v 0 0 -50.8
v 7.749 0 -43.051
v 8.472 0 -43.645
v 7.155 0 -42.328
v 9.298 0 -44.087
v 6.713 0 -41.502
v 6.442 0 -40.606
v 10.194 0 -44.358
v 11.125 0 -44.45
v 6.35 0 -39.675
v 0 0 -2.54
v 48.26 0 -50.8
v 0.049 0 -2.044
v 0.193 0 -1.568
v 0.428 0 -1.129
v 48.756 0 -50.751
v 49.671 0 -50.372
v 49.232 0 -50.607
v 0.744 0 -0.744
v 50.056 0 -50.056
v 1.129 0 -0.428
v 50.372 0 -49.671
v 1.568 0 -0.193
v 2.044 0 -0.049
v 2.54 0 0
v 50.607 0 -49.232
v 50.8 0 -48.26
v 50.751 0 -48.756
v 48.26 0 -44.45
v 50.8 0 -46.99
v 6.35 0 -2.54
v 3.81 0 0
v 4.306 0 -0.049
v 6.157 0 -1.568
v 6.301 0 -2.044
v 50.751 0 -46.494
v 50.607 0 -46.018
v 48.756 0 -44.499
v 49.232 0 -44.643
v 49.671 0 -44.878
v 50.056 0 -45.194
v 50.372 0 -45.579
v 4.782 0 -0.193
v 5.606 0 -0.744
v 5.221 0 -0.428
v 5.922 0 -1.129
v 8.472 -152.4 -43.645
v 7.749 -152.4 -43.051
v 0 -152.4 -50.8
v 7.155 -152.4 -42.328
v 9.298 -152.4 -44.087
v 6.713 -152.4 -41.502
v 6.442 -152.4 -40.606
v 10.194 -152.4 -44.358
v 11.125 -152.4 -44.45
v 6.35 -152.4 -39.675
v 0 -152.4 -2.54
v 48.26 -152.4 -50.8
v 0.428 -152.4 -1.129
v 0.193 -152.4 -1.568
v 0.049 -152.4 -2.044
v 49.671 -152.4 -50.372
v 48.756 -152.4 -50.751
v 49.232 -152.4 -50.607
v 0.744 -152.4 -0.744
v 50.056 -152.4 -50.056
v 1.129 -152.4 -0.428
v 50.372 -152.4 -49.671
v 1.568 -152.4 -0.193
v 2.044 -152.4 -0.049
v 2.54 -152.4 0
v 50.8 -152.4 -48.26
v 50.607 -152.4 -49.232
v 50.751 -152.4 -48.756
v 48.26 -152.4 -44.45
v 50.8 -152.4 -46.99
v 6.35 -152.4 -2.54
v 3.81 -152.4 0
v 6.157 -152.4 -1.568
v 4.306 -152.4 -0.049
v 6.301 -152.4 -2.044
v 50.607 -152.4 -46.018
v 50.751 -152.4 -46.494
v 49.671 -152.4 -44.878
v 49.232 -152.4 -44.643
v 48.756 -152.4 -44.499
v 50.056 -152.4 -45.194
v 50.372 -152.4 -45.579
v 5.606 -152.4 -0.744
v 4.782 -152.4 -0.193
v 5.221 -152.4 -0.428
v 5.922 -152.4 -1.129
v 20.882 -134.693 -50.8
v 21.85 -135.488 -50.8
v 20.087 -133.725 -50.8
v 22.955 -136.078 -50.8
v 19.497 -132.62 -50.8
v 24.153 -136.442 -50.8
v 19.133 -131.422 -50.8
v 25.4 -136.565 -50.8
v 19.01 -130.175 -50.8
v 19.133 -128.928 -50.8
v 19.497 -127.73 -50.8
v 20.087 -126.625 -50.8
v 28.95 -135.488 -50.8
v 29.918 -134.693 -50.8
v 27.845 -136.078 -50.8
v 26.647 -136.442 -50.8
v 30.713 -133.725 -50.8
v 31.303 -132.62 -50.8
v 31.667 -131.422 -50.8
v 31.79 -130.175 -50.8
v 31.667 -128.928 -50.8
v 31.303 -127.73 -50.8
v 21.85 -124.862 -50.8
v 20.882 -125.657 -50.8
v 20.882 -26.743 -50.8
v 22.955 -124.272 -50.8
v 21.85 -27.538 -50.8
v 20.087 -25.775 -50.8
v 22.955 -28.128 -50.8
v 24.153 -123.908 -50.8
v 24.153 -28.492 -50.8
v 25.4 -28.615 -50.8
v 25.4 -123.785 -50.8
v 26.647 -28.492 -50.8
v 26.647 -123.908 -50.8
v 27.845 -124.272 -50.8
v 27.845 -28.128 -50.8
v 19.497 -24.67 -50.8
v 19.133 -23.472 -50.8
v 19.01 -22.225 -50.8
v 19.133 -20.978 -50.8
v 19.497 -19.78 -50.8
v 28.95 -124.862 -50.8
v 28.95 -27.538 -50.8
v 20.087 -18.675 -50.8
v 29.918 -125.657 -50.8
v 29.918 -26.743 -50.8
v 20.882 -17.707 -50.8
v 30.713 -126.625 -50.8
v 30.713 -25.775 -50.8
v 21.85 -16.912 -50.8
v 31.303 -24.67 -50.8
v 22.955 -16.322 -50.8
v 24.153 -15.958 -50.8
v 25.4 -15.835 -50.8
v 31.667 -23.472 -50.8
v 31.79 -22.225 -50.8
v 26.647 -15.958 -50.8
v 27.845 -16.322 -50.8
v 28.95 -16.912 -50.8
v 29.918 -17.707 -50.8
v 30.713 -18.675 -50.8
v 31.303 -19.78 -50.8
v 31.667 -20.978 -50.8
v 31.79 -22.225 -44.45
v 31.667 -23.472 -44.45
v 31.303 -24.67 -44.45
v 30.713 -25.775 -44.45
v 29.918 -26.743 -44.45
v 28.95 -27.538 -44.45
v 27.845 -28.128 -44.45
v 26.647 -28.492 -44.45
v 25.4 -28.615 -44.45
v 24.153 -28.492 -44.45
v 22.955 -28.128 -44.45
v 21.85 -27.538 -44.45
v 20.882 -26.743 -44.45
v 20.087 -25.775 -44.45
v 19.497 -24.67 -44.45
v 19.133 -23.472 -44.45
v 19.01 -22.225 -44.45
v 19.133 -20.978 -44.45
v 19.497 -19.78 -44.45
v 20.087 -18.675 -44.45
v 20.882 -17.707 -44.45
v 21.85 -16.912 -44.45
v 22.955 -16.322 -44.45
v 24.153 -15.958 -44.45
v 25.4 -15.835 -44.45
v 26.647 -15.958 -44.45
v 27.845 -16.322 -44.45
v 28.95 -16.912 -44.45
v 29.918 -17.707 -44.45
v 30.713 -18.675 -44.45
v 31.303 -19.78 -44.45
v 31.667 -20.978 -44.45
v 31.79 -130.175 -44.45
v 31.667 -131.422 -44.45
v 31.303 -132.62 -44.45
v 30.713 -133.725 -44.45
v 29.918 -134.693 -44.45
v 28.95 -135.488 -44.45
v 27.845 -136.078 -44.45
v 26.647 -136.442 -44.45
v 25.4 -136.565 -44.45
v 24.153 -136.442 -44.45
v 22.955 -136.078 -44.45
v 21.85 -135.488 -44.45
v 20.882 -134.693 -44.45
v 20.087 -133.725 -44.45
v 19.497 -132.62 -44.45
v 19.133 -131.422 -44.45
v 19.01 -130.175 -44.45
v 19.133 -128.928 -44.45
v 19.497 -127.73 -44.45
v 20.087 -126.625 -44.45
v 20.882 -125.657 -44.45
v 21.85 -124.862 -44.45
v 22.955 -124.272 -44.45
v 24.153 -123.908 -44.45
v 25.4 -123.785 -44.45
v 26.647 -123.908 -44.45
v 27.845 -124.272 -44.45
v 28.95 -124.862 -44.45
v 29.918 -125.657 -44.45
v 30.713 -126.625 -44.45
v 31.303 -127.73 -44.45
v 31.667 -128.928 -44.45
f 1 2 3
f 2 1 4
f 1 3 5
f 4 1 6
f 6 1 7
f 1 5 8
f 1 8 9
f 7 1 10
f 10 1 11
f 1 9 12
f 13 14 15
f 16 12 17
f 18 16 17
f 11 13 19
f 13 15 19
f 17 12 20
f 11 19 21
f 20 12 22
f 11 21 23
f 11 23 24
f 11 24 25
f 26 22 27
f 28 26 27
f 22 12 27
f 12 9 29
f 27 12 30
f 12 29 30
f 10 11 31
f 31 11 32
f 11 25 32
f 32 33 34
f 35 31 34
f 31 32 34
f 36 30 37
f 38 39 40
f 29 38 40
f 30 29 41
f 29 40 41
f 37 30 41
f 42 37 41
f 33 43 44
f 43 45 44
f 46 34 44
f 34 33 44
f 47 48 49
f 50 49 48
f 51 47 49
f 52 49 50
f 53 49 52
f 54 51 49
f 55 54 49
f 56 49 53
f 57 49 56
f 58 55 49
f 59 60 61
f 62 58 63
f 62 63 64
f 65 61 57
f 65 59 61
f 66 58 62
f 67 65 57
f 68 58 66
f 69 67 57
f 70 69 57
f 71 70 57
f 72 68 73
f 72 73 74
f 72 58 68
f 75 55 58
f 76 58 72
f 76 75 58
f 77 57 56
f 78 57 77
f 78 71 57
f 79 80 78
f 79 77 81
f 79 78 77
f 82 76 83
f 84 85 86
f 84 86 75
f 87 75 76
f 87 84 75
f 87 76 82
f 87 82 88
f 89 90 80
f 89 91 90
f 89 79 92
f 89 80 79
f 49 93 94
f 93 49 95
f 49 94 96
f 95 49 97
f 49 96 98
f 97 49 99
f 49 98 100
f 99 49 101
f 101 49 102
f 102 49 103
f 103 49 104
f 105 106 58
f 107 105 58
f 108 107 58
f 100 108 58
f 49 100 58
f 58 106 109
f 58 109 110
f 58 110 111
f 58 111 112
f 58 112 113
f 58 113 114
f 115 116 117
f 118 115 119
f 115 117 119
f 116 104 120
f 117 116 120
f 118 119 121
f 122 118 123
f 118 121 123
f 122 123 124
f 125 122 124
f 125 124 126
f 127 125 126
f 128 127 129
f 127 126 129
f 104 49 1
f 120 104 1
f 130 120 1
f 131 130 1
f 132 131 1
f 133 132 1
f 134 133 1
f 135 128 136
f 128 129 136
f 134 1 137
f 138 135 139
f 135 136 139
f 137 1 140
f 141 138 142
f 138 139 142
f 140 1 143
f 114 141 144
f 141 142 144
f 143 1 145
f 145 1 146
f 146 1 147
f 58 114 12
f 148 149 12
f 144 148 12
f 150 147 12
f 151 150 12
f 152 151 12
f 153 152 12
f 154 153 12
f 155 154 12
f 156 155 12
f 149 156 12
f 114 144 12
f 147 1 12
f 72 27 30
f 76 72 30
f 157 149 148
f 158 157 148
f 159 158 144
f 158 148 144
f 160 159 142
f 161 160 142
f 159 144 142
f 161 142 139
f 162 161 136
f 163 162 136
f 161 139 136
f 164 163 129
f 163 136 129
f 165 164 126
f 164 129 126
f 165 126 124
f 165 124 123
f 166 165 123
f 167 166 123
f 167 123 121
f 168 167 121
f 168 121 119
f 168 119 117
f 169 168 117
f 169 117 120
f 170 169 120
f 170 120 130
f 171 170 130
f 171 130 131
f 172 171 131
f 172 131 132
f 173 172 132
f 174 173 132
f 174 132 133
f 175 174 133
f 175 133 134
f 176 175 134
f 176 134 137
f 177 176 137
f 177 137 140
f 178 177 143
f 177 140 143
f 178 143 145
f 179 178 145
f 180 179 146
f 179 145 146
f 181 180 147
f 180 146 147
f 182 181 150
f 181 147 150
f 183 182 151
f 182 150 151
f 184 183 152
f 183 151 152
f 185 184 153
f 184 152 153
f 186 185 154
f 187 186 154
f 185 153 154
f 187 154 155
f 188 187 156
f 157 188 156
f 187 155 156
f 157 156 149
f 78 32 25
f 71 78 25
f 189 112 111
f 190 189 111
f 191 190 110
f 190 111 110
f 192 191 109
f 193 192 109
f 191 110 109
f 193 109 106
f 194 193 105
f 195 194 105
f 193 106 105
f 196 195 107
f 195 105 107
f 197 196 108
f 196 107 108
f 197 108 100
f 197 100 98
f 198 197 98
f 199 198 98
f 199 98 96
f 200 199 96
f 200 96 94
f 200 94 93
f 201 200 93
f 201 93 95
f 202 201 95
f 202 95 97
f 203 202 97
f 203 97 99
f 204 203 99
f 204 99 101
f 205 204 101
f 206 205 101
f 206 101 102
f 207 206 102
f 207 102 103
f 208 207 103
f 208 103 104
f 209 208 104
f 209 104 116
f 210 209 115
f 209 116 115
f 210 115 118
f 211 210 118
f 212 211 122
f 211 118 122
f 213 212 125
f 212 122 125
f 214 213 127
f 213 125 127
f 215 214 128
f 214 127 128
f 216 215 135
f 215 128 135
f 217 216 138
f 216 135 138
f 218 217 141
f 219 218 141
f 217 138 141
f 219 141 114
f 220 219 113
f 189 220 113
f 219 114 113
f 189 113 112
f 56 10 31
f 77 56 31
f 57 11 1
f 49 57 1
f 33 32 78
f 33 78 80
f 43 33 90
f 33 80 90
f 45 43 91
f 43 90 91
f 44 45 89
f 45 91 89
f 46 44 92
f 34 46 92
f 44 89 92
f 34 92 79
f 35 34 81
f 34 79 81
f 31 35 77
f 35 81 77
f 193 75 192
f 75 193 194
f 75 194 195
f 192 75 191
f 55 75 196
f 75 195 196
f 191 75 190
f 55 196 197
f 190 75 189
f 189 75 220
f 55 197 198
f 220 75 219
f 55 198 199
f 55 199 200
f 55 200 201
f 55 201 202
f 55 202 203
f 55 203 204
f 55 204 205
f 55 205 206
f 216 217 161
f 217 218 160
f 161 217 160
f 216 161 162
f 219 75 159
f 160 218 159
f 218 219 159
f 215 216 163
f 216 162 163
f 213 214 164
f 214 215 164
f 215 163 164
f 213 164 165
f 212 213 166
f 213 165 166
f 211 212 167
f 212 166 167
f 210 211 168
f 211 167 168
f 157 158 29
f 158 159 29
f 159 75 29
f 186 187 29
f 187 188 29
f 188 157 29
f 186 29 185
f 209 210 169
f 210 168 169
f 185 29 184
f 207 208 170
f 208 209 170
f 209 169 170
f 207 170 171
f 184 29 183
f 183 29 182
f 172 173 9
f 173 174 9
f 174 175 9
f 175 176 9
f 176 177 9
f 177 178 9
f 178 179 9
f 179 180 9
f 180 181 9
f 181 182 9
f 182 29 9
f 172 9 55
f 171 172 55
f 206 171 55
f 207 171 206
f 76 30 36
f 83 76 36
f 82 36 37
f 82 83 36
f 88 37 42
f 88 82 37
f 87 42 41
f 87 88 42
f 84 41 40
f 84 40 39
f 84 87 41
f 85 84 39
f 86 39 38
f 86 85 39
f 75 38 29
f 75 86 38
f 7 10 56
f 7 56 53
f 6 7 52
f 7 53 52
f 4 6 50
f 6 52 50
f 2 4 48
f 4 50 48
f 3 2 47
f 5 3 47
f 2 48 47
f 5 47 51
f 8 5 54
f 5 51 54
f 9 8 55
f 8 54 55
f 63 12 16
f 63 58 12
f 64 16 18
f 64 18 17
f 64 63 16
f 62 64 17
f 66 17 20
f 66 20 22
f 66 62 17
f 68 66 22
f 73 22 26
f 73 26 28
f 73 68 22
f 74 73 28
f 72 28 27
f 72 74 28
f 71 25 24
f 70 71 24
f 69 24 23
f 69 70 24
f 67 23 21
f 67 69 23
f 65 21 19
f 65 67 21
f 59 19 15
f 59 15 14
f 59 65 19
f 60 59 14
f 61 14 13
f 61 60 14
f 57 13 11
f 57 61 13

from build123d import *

# Parameters (mm, degrees)
F1_DEPTH = 152.4
F2_R     = 2.54
F3_R     = 4.7752
F4_R     = 6.389688
F5_DEPTH = 25.4


with BuildPart() as f1:
    # F0 (on Front) → F1 (new body)
    with BuildSketch(Plane.XZ):
        Polygon((6.35, 0), (0, 0), (0, -50.8), (50.8, -50.8), (50.8, -44.45), (6.35, -44.45), align=None)
    extrude(amount=F1_DEPTH)

    # F2
    f2_edges = [f1.edges().sort_by_distance(p)[0] for p in [
        (6.35, -76.2, 0),
        (0, -76.2, 0),
        (50.8, -76.2, -44.45),
        (50.8, -76.2, -50.8),
    ]]
    fillet(f2_edges, radius=F2_R)

    # F3
    f3_edges = [f1.edges().sort_by_distance(p)[0] for p in [
        (6.35, -76.2, -44.45),
    ]]
    fillet(f3_edges, radius=F3_R)

    # F4 (on face) → F5 (cut)
    with BuildSketch(Plane(origin=(0, 0, -50.8), x_dir=(1, 0, 0), z_dir=(0, 0, -1))):
        with Locations((25.4, 130.175)):
            Circle(F4_R)
        with Locations((25.4, 22.225)):
            Circle(F4_R)
    extrude(amount=-F5_DEPTH, mode=Mode.SUBTRACT)


solid = f1.part
